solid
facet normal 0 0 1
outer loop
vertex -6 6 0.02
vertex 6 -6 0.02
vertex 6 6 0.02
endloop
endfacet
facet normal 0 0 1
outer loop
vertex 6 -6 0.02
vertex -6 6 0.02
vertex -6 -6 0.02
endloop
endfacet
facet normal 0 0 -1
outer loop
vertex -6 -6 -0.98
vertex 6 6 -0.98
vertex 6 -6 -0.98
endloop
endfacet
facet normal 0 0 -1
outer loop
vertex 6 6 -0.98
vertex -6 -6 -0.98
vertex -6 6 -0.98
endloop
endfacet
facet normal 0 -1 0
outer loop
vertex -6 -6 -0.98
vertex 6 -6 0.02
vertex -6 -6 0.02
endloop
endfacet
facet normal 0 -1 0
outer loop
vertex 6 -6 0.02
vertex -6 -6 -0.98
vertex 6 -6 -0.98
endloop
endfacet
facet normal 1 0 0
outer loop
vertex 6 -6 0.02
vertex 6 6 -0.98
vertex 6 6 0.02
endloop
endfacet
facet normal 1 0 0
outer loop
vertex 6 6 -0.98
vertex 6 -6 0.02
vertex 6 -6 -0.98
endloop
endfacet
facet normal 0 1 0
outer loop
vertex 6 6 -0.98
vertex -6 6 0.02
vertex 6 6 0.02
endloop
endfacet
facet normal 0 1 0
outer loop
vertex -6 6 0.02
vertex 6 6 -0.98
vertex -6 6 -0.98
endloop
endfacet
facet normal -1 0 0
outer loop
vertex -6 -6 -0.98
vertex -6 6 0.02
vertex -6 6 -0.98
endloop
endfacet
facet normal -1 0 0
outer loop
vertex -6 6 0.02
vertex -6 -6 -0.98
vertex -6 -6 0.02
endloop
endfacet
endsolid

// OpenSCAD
use <lib.scad>

module pinHD() {
	hull() { cyl(0.24,0.24,0.965,$fn=16); cyl(0.2,0.2,1,$fn=16); }
}

module slabPavedHD() {
	translate([0,0,-0.48]) intersection() {
		union() {
			difference() {
				box([12,12,1]);
				for (i = [-6:2:6]) translate([0,i,0.57]) scale([1,2,1]) rotate([30,0,0]) rotate([0,90,0]) cyl(0.1, 0.1, 13, $fn=6);
				rotate([0,0,90]) for (i = [-6:2:6]) translate([0,i,0.57]) scale([1,2,1]) rotate([30,0,0]) rotate([0,90,0]) cyl(0.1, 0.1, 13, $fn=6);
			}
			translate([6,6,0]) pinHD();
			translate([-6,6,0]) pinHD();
			translate([6,-6,0]) pinHD();
			translate([-6,-6,0]) pinHD();
		}
		box([12,12,1]);
	}
}

module slabPavedLD() {
	translate([0,0,-0.48]) difference() {
		box([12,12,1]);
		for (i = [-6:4:6]) translate([0,i,0.575]) scale([1,2.5,1]) rotate([30,0,0]) rotate([0,90,0]) cyl(0.1, 0.1, 13, $fn=6);
		rotate([0,0,90]) for (i = [-6:4:6]) translate([0,i,0.575]) scale([1,2.5,1]) rotate([30,0,0]) rotate([0,90,0]) cyl(0.1, 0.1, 13, $fn=6);
	}
}

module slabPavedVLD() {
	translate([0,0,-0.48]) difference() {
		box([12,12,1]);
	}
}

//slabPavedHD();
//slabPavedLD();
slabPavedVLD();
